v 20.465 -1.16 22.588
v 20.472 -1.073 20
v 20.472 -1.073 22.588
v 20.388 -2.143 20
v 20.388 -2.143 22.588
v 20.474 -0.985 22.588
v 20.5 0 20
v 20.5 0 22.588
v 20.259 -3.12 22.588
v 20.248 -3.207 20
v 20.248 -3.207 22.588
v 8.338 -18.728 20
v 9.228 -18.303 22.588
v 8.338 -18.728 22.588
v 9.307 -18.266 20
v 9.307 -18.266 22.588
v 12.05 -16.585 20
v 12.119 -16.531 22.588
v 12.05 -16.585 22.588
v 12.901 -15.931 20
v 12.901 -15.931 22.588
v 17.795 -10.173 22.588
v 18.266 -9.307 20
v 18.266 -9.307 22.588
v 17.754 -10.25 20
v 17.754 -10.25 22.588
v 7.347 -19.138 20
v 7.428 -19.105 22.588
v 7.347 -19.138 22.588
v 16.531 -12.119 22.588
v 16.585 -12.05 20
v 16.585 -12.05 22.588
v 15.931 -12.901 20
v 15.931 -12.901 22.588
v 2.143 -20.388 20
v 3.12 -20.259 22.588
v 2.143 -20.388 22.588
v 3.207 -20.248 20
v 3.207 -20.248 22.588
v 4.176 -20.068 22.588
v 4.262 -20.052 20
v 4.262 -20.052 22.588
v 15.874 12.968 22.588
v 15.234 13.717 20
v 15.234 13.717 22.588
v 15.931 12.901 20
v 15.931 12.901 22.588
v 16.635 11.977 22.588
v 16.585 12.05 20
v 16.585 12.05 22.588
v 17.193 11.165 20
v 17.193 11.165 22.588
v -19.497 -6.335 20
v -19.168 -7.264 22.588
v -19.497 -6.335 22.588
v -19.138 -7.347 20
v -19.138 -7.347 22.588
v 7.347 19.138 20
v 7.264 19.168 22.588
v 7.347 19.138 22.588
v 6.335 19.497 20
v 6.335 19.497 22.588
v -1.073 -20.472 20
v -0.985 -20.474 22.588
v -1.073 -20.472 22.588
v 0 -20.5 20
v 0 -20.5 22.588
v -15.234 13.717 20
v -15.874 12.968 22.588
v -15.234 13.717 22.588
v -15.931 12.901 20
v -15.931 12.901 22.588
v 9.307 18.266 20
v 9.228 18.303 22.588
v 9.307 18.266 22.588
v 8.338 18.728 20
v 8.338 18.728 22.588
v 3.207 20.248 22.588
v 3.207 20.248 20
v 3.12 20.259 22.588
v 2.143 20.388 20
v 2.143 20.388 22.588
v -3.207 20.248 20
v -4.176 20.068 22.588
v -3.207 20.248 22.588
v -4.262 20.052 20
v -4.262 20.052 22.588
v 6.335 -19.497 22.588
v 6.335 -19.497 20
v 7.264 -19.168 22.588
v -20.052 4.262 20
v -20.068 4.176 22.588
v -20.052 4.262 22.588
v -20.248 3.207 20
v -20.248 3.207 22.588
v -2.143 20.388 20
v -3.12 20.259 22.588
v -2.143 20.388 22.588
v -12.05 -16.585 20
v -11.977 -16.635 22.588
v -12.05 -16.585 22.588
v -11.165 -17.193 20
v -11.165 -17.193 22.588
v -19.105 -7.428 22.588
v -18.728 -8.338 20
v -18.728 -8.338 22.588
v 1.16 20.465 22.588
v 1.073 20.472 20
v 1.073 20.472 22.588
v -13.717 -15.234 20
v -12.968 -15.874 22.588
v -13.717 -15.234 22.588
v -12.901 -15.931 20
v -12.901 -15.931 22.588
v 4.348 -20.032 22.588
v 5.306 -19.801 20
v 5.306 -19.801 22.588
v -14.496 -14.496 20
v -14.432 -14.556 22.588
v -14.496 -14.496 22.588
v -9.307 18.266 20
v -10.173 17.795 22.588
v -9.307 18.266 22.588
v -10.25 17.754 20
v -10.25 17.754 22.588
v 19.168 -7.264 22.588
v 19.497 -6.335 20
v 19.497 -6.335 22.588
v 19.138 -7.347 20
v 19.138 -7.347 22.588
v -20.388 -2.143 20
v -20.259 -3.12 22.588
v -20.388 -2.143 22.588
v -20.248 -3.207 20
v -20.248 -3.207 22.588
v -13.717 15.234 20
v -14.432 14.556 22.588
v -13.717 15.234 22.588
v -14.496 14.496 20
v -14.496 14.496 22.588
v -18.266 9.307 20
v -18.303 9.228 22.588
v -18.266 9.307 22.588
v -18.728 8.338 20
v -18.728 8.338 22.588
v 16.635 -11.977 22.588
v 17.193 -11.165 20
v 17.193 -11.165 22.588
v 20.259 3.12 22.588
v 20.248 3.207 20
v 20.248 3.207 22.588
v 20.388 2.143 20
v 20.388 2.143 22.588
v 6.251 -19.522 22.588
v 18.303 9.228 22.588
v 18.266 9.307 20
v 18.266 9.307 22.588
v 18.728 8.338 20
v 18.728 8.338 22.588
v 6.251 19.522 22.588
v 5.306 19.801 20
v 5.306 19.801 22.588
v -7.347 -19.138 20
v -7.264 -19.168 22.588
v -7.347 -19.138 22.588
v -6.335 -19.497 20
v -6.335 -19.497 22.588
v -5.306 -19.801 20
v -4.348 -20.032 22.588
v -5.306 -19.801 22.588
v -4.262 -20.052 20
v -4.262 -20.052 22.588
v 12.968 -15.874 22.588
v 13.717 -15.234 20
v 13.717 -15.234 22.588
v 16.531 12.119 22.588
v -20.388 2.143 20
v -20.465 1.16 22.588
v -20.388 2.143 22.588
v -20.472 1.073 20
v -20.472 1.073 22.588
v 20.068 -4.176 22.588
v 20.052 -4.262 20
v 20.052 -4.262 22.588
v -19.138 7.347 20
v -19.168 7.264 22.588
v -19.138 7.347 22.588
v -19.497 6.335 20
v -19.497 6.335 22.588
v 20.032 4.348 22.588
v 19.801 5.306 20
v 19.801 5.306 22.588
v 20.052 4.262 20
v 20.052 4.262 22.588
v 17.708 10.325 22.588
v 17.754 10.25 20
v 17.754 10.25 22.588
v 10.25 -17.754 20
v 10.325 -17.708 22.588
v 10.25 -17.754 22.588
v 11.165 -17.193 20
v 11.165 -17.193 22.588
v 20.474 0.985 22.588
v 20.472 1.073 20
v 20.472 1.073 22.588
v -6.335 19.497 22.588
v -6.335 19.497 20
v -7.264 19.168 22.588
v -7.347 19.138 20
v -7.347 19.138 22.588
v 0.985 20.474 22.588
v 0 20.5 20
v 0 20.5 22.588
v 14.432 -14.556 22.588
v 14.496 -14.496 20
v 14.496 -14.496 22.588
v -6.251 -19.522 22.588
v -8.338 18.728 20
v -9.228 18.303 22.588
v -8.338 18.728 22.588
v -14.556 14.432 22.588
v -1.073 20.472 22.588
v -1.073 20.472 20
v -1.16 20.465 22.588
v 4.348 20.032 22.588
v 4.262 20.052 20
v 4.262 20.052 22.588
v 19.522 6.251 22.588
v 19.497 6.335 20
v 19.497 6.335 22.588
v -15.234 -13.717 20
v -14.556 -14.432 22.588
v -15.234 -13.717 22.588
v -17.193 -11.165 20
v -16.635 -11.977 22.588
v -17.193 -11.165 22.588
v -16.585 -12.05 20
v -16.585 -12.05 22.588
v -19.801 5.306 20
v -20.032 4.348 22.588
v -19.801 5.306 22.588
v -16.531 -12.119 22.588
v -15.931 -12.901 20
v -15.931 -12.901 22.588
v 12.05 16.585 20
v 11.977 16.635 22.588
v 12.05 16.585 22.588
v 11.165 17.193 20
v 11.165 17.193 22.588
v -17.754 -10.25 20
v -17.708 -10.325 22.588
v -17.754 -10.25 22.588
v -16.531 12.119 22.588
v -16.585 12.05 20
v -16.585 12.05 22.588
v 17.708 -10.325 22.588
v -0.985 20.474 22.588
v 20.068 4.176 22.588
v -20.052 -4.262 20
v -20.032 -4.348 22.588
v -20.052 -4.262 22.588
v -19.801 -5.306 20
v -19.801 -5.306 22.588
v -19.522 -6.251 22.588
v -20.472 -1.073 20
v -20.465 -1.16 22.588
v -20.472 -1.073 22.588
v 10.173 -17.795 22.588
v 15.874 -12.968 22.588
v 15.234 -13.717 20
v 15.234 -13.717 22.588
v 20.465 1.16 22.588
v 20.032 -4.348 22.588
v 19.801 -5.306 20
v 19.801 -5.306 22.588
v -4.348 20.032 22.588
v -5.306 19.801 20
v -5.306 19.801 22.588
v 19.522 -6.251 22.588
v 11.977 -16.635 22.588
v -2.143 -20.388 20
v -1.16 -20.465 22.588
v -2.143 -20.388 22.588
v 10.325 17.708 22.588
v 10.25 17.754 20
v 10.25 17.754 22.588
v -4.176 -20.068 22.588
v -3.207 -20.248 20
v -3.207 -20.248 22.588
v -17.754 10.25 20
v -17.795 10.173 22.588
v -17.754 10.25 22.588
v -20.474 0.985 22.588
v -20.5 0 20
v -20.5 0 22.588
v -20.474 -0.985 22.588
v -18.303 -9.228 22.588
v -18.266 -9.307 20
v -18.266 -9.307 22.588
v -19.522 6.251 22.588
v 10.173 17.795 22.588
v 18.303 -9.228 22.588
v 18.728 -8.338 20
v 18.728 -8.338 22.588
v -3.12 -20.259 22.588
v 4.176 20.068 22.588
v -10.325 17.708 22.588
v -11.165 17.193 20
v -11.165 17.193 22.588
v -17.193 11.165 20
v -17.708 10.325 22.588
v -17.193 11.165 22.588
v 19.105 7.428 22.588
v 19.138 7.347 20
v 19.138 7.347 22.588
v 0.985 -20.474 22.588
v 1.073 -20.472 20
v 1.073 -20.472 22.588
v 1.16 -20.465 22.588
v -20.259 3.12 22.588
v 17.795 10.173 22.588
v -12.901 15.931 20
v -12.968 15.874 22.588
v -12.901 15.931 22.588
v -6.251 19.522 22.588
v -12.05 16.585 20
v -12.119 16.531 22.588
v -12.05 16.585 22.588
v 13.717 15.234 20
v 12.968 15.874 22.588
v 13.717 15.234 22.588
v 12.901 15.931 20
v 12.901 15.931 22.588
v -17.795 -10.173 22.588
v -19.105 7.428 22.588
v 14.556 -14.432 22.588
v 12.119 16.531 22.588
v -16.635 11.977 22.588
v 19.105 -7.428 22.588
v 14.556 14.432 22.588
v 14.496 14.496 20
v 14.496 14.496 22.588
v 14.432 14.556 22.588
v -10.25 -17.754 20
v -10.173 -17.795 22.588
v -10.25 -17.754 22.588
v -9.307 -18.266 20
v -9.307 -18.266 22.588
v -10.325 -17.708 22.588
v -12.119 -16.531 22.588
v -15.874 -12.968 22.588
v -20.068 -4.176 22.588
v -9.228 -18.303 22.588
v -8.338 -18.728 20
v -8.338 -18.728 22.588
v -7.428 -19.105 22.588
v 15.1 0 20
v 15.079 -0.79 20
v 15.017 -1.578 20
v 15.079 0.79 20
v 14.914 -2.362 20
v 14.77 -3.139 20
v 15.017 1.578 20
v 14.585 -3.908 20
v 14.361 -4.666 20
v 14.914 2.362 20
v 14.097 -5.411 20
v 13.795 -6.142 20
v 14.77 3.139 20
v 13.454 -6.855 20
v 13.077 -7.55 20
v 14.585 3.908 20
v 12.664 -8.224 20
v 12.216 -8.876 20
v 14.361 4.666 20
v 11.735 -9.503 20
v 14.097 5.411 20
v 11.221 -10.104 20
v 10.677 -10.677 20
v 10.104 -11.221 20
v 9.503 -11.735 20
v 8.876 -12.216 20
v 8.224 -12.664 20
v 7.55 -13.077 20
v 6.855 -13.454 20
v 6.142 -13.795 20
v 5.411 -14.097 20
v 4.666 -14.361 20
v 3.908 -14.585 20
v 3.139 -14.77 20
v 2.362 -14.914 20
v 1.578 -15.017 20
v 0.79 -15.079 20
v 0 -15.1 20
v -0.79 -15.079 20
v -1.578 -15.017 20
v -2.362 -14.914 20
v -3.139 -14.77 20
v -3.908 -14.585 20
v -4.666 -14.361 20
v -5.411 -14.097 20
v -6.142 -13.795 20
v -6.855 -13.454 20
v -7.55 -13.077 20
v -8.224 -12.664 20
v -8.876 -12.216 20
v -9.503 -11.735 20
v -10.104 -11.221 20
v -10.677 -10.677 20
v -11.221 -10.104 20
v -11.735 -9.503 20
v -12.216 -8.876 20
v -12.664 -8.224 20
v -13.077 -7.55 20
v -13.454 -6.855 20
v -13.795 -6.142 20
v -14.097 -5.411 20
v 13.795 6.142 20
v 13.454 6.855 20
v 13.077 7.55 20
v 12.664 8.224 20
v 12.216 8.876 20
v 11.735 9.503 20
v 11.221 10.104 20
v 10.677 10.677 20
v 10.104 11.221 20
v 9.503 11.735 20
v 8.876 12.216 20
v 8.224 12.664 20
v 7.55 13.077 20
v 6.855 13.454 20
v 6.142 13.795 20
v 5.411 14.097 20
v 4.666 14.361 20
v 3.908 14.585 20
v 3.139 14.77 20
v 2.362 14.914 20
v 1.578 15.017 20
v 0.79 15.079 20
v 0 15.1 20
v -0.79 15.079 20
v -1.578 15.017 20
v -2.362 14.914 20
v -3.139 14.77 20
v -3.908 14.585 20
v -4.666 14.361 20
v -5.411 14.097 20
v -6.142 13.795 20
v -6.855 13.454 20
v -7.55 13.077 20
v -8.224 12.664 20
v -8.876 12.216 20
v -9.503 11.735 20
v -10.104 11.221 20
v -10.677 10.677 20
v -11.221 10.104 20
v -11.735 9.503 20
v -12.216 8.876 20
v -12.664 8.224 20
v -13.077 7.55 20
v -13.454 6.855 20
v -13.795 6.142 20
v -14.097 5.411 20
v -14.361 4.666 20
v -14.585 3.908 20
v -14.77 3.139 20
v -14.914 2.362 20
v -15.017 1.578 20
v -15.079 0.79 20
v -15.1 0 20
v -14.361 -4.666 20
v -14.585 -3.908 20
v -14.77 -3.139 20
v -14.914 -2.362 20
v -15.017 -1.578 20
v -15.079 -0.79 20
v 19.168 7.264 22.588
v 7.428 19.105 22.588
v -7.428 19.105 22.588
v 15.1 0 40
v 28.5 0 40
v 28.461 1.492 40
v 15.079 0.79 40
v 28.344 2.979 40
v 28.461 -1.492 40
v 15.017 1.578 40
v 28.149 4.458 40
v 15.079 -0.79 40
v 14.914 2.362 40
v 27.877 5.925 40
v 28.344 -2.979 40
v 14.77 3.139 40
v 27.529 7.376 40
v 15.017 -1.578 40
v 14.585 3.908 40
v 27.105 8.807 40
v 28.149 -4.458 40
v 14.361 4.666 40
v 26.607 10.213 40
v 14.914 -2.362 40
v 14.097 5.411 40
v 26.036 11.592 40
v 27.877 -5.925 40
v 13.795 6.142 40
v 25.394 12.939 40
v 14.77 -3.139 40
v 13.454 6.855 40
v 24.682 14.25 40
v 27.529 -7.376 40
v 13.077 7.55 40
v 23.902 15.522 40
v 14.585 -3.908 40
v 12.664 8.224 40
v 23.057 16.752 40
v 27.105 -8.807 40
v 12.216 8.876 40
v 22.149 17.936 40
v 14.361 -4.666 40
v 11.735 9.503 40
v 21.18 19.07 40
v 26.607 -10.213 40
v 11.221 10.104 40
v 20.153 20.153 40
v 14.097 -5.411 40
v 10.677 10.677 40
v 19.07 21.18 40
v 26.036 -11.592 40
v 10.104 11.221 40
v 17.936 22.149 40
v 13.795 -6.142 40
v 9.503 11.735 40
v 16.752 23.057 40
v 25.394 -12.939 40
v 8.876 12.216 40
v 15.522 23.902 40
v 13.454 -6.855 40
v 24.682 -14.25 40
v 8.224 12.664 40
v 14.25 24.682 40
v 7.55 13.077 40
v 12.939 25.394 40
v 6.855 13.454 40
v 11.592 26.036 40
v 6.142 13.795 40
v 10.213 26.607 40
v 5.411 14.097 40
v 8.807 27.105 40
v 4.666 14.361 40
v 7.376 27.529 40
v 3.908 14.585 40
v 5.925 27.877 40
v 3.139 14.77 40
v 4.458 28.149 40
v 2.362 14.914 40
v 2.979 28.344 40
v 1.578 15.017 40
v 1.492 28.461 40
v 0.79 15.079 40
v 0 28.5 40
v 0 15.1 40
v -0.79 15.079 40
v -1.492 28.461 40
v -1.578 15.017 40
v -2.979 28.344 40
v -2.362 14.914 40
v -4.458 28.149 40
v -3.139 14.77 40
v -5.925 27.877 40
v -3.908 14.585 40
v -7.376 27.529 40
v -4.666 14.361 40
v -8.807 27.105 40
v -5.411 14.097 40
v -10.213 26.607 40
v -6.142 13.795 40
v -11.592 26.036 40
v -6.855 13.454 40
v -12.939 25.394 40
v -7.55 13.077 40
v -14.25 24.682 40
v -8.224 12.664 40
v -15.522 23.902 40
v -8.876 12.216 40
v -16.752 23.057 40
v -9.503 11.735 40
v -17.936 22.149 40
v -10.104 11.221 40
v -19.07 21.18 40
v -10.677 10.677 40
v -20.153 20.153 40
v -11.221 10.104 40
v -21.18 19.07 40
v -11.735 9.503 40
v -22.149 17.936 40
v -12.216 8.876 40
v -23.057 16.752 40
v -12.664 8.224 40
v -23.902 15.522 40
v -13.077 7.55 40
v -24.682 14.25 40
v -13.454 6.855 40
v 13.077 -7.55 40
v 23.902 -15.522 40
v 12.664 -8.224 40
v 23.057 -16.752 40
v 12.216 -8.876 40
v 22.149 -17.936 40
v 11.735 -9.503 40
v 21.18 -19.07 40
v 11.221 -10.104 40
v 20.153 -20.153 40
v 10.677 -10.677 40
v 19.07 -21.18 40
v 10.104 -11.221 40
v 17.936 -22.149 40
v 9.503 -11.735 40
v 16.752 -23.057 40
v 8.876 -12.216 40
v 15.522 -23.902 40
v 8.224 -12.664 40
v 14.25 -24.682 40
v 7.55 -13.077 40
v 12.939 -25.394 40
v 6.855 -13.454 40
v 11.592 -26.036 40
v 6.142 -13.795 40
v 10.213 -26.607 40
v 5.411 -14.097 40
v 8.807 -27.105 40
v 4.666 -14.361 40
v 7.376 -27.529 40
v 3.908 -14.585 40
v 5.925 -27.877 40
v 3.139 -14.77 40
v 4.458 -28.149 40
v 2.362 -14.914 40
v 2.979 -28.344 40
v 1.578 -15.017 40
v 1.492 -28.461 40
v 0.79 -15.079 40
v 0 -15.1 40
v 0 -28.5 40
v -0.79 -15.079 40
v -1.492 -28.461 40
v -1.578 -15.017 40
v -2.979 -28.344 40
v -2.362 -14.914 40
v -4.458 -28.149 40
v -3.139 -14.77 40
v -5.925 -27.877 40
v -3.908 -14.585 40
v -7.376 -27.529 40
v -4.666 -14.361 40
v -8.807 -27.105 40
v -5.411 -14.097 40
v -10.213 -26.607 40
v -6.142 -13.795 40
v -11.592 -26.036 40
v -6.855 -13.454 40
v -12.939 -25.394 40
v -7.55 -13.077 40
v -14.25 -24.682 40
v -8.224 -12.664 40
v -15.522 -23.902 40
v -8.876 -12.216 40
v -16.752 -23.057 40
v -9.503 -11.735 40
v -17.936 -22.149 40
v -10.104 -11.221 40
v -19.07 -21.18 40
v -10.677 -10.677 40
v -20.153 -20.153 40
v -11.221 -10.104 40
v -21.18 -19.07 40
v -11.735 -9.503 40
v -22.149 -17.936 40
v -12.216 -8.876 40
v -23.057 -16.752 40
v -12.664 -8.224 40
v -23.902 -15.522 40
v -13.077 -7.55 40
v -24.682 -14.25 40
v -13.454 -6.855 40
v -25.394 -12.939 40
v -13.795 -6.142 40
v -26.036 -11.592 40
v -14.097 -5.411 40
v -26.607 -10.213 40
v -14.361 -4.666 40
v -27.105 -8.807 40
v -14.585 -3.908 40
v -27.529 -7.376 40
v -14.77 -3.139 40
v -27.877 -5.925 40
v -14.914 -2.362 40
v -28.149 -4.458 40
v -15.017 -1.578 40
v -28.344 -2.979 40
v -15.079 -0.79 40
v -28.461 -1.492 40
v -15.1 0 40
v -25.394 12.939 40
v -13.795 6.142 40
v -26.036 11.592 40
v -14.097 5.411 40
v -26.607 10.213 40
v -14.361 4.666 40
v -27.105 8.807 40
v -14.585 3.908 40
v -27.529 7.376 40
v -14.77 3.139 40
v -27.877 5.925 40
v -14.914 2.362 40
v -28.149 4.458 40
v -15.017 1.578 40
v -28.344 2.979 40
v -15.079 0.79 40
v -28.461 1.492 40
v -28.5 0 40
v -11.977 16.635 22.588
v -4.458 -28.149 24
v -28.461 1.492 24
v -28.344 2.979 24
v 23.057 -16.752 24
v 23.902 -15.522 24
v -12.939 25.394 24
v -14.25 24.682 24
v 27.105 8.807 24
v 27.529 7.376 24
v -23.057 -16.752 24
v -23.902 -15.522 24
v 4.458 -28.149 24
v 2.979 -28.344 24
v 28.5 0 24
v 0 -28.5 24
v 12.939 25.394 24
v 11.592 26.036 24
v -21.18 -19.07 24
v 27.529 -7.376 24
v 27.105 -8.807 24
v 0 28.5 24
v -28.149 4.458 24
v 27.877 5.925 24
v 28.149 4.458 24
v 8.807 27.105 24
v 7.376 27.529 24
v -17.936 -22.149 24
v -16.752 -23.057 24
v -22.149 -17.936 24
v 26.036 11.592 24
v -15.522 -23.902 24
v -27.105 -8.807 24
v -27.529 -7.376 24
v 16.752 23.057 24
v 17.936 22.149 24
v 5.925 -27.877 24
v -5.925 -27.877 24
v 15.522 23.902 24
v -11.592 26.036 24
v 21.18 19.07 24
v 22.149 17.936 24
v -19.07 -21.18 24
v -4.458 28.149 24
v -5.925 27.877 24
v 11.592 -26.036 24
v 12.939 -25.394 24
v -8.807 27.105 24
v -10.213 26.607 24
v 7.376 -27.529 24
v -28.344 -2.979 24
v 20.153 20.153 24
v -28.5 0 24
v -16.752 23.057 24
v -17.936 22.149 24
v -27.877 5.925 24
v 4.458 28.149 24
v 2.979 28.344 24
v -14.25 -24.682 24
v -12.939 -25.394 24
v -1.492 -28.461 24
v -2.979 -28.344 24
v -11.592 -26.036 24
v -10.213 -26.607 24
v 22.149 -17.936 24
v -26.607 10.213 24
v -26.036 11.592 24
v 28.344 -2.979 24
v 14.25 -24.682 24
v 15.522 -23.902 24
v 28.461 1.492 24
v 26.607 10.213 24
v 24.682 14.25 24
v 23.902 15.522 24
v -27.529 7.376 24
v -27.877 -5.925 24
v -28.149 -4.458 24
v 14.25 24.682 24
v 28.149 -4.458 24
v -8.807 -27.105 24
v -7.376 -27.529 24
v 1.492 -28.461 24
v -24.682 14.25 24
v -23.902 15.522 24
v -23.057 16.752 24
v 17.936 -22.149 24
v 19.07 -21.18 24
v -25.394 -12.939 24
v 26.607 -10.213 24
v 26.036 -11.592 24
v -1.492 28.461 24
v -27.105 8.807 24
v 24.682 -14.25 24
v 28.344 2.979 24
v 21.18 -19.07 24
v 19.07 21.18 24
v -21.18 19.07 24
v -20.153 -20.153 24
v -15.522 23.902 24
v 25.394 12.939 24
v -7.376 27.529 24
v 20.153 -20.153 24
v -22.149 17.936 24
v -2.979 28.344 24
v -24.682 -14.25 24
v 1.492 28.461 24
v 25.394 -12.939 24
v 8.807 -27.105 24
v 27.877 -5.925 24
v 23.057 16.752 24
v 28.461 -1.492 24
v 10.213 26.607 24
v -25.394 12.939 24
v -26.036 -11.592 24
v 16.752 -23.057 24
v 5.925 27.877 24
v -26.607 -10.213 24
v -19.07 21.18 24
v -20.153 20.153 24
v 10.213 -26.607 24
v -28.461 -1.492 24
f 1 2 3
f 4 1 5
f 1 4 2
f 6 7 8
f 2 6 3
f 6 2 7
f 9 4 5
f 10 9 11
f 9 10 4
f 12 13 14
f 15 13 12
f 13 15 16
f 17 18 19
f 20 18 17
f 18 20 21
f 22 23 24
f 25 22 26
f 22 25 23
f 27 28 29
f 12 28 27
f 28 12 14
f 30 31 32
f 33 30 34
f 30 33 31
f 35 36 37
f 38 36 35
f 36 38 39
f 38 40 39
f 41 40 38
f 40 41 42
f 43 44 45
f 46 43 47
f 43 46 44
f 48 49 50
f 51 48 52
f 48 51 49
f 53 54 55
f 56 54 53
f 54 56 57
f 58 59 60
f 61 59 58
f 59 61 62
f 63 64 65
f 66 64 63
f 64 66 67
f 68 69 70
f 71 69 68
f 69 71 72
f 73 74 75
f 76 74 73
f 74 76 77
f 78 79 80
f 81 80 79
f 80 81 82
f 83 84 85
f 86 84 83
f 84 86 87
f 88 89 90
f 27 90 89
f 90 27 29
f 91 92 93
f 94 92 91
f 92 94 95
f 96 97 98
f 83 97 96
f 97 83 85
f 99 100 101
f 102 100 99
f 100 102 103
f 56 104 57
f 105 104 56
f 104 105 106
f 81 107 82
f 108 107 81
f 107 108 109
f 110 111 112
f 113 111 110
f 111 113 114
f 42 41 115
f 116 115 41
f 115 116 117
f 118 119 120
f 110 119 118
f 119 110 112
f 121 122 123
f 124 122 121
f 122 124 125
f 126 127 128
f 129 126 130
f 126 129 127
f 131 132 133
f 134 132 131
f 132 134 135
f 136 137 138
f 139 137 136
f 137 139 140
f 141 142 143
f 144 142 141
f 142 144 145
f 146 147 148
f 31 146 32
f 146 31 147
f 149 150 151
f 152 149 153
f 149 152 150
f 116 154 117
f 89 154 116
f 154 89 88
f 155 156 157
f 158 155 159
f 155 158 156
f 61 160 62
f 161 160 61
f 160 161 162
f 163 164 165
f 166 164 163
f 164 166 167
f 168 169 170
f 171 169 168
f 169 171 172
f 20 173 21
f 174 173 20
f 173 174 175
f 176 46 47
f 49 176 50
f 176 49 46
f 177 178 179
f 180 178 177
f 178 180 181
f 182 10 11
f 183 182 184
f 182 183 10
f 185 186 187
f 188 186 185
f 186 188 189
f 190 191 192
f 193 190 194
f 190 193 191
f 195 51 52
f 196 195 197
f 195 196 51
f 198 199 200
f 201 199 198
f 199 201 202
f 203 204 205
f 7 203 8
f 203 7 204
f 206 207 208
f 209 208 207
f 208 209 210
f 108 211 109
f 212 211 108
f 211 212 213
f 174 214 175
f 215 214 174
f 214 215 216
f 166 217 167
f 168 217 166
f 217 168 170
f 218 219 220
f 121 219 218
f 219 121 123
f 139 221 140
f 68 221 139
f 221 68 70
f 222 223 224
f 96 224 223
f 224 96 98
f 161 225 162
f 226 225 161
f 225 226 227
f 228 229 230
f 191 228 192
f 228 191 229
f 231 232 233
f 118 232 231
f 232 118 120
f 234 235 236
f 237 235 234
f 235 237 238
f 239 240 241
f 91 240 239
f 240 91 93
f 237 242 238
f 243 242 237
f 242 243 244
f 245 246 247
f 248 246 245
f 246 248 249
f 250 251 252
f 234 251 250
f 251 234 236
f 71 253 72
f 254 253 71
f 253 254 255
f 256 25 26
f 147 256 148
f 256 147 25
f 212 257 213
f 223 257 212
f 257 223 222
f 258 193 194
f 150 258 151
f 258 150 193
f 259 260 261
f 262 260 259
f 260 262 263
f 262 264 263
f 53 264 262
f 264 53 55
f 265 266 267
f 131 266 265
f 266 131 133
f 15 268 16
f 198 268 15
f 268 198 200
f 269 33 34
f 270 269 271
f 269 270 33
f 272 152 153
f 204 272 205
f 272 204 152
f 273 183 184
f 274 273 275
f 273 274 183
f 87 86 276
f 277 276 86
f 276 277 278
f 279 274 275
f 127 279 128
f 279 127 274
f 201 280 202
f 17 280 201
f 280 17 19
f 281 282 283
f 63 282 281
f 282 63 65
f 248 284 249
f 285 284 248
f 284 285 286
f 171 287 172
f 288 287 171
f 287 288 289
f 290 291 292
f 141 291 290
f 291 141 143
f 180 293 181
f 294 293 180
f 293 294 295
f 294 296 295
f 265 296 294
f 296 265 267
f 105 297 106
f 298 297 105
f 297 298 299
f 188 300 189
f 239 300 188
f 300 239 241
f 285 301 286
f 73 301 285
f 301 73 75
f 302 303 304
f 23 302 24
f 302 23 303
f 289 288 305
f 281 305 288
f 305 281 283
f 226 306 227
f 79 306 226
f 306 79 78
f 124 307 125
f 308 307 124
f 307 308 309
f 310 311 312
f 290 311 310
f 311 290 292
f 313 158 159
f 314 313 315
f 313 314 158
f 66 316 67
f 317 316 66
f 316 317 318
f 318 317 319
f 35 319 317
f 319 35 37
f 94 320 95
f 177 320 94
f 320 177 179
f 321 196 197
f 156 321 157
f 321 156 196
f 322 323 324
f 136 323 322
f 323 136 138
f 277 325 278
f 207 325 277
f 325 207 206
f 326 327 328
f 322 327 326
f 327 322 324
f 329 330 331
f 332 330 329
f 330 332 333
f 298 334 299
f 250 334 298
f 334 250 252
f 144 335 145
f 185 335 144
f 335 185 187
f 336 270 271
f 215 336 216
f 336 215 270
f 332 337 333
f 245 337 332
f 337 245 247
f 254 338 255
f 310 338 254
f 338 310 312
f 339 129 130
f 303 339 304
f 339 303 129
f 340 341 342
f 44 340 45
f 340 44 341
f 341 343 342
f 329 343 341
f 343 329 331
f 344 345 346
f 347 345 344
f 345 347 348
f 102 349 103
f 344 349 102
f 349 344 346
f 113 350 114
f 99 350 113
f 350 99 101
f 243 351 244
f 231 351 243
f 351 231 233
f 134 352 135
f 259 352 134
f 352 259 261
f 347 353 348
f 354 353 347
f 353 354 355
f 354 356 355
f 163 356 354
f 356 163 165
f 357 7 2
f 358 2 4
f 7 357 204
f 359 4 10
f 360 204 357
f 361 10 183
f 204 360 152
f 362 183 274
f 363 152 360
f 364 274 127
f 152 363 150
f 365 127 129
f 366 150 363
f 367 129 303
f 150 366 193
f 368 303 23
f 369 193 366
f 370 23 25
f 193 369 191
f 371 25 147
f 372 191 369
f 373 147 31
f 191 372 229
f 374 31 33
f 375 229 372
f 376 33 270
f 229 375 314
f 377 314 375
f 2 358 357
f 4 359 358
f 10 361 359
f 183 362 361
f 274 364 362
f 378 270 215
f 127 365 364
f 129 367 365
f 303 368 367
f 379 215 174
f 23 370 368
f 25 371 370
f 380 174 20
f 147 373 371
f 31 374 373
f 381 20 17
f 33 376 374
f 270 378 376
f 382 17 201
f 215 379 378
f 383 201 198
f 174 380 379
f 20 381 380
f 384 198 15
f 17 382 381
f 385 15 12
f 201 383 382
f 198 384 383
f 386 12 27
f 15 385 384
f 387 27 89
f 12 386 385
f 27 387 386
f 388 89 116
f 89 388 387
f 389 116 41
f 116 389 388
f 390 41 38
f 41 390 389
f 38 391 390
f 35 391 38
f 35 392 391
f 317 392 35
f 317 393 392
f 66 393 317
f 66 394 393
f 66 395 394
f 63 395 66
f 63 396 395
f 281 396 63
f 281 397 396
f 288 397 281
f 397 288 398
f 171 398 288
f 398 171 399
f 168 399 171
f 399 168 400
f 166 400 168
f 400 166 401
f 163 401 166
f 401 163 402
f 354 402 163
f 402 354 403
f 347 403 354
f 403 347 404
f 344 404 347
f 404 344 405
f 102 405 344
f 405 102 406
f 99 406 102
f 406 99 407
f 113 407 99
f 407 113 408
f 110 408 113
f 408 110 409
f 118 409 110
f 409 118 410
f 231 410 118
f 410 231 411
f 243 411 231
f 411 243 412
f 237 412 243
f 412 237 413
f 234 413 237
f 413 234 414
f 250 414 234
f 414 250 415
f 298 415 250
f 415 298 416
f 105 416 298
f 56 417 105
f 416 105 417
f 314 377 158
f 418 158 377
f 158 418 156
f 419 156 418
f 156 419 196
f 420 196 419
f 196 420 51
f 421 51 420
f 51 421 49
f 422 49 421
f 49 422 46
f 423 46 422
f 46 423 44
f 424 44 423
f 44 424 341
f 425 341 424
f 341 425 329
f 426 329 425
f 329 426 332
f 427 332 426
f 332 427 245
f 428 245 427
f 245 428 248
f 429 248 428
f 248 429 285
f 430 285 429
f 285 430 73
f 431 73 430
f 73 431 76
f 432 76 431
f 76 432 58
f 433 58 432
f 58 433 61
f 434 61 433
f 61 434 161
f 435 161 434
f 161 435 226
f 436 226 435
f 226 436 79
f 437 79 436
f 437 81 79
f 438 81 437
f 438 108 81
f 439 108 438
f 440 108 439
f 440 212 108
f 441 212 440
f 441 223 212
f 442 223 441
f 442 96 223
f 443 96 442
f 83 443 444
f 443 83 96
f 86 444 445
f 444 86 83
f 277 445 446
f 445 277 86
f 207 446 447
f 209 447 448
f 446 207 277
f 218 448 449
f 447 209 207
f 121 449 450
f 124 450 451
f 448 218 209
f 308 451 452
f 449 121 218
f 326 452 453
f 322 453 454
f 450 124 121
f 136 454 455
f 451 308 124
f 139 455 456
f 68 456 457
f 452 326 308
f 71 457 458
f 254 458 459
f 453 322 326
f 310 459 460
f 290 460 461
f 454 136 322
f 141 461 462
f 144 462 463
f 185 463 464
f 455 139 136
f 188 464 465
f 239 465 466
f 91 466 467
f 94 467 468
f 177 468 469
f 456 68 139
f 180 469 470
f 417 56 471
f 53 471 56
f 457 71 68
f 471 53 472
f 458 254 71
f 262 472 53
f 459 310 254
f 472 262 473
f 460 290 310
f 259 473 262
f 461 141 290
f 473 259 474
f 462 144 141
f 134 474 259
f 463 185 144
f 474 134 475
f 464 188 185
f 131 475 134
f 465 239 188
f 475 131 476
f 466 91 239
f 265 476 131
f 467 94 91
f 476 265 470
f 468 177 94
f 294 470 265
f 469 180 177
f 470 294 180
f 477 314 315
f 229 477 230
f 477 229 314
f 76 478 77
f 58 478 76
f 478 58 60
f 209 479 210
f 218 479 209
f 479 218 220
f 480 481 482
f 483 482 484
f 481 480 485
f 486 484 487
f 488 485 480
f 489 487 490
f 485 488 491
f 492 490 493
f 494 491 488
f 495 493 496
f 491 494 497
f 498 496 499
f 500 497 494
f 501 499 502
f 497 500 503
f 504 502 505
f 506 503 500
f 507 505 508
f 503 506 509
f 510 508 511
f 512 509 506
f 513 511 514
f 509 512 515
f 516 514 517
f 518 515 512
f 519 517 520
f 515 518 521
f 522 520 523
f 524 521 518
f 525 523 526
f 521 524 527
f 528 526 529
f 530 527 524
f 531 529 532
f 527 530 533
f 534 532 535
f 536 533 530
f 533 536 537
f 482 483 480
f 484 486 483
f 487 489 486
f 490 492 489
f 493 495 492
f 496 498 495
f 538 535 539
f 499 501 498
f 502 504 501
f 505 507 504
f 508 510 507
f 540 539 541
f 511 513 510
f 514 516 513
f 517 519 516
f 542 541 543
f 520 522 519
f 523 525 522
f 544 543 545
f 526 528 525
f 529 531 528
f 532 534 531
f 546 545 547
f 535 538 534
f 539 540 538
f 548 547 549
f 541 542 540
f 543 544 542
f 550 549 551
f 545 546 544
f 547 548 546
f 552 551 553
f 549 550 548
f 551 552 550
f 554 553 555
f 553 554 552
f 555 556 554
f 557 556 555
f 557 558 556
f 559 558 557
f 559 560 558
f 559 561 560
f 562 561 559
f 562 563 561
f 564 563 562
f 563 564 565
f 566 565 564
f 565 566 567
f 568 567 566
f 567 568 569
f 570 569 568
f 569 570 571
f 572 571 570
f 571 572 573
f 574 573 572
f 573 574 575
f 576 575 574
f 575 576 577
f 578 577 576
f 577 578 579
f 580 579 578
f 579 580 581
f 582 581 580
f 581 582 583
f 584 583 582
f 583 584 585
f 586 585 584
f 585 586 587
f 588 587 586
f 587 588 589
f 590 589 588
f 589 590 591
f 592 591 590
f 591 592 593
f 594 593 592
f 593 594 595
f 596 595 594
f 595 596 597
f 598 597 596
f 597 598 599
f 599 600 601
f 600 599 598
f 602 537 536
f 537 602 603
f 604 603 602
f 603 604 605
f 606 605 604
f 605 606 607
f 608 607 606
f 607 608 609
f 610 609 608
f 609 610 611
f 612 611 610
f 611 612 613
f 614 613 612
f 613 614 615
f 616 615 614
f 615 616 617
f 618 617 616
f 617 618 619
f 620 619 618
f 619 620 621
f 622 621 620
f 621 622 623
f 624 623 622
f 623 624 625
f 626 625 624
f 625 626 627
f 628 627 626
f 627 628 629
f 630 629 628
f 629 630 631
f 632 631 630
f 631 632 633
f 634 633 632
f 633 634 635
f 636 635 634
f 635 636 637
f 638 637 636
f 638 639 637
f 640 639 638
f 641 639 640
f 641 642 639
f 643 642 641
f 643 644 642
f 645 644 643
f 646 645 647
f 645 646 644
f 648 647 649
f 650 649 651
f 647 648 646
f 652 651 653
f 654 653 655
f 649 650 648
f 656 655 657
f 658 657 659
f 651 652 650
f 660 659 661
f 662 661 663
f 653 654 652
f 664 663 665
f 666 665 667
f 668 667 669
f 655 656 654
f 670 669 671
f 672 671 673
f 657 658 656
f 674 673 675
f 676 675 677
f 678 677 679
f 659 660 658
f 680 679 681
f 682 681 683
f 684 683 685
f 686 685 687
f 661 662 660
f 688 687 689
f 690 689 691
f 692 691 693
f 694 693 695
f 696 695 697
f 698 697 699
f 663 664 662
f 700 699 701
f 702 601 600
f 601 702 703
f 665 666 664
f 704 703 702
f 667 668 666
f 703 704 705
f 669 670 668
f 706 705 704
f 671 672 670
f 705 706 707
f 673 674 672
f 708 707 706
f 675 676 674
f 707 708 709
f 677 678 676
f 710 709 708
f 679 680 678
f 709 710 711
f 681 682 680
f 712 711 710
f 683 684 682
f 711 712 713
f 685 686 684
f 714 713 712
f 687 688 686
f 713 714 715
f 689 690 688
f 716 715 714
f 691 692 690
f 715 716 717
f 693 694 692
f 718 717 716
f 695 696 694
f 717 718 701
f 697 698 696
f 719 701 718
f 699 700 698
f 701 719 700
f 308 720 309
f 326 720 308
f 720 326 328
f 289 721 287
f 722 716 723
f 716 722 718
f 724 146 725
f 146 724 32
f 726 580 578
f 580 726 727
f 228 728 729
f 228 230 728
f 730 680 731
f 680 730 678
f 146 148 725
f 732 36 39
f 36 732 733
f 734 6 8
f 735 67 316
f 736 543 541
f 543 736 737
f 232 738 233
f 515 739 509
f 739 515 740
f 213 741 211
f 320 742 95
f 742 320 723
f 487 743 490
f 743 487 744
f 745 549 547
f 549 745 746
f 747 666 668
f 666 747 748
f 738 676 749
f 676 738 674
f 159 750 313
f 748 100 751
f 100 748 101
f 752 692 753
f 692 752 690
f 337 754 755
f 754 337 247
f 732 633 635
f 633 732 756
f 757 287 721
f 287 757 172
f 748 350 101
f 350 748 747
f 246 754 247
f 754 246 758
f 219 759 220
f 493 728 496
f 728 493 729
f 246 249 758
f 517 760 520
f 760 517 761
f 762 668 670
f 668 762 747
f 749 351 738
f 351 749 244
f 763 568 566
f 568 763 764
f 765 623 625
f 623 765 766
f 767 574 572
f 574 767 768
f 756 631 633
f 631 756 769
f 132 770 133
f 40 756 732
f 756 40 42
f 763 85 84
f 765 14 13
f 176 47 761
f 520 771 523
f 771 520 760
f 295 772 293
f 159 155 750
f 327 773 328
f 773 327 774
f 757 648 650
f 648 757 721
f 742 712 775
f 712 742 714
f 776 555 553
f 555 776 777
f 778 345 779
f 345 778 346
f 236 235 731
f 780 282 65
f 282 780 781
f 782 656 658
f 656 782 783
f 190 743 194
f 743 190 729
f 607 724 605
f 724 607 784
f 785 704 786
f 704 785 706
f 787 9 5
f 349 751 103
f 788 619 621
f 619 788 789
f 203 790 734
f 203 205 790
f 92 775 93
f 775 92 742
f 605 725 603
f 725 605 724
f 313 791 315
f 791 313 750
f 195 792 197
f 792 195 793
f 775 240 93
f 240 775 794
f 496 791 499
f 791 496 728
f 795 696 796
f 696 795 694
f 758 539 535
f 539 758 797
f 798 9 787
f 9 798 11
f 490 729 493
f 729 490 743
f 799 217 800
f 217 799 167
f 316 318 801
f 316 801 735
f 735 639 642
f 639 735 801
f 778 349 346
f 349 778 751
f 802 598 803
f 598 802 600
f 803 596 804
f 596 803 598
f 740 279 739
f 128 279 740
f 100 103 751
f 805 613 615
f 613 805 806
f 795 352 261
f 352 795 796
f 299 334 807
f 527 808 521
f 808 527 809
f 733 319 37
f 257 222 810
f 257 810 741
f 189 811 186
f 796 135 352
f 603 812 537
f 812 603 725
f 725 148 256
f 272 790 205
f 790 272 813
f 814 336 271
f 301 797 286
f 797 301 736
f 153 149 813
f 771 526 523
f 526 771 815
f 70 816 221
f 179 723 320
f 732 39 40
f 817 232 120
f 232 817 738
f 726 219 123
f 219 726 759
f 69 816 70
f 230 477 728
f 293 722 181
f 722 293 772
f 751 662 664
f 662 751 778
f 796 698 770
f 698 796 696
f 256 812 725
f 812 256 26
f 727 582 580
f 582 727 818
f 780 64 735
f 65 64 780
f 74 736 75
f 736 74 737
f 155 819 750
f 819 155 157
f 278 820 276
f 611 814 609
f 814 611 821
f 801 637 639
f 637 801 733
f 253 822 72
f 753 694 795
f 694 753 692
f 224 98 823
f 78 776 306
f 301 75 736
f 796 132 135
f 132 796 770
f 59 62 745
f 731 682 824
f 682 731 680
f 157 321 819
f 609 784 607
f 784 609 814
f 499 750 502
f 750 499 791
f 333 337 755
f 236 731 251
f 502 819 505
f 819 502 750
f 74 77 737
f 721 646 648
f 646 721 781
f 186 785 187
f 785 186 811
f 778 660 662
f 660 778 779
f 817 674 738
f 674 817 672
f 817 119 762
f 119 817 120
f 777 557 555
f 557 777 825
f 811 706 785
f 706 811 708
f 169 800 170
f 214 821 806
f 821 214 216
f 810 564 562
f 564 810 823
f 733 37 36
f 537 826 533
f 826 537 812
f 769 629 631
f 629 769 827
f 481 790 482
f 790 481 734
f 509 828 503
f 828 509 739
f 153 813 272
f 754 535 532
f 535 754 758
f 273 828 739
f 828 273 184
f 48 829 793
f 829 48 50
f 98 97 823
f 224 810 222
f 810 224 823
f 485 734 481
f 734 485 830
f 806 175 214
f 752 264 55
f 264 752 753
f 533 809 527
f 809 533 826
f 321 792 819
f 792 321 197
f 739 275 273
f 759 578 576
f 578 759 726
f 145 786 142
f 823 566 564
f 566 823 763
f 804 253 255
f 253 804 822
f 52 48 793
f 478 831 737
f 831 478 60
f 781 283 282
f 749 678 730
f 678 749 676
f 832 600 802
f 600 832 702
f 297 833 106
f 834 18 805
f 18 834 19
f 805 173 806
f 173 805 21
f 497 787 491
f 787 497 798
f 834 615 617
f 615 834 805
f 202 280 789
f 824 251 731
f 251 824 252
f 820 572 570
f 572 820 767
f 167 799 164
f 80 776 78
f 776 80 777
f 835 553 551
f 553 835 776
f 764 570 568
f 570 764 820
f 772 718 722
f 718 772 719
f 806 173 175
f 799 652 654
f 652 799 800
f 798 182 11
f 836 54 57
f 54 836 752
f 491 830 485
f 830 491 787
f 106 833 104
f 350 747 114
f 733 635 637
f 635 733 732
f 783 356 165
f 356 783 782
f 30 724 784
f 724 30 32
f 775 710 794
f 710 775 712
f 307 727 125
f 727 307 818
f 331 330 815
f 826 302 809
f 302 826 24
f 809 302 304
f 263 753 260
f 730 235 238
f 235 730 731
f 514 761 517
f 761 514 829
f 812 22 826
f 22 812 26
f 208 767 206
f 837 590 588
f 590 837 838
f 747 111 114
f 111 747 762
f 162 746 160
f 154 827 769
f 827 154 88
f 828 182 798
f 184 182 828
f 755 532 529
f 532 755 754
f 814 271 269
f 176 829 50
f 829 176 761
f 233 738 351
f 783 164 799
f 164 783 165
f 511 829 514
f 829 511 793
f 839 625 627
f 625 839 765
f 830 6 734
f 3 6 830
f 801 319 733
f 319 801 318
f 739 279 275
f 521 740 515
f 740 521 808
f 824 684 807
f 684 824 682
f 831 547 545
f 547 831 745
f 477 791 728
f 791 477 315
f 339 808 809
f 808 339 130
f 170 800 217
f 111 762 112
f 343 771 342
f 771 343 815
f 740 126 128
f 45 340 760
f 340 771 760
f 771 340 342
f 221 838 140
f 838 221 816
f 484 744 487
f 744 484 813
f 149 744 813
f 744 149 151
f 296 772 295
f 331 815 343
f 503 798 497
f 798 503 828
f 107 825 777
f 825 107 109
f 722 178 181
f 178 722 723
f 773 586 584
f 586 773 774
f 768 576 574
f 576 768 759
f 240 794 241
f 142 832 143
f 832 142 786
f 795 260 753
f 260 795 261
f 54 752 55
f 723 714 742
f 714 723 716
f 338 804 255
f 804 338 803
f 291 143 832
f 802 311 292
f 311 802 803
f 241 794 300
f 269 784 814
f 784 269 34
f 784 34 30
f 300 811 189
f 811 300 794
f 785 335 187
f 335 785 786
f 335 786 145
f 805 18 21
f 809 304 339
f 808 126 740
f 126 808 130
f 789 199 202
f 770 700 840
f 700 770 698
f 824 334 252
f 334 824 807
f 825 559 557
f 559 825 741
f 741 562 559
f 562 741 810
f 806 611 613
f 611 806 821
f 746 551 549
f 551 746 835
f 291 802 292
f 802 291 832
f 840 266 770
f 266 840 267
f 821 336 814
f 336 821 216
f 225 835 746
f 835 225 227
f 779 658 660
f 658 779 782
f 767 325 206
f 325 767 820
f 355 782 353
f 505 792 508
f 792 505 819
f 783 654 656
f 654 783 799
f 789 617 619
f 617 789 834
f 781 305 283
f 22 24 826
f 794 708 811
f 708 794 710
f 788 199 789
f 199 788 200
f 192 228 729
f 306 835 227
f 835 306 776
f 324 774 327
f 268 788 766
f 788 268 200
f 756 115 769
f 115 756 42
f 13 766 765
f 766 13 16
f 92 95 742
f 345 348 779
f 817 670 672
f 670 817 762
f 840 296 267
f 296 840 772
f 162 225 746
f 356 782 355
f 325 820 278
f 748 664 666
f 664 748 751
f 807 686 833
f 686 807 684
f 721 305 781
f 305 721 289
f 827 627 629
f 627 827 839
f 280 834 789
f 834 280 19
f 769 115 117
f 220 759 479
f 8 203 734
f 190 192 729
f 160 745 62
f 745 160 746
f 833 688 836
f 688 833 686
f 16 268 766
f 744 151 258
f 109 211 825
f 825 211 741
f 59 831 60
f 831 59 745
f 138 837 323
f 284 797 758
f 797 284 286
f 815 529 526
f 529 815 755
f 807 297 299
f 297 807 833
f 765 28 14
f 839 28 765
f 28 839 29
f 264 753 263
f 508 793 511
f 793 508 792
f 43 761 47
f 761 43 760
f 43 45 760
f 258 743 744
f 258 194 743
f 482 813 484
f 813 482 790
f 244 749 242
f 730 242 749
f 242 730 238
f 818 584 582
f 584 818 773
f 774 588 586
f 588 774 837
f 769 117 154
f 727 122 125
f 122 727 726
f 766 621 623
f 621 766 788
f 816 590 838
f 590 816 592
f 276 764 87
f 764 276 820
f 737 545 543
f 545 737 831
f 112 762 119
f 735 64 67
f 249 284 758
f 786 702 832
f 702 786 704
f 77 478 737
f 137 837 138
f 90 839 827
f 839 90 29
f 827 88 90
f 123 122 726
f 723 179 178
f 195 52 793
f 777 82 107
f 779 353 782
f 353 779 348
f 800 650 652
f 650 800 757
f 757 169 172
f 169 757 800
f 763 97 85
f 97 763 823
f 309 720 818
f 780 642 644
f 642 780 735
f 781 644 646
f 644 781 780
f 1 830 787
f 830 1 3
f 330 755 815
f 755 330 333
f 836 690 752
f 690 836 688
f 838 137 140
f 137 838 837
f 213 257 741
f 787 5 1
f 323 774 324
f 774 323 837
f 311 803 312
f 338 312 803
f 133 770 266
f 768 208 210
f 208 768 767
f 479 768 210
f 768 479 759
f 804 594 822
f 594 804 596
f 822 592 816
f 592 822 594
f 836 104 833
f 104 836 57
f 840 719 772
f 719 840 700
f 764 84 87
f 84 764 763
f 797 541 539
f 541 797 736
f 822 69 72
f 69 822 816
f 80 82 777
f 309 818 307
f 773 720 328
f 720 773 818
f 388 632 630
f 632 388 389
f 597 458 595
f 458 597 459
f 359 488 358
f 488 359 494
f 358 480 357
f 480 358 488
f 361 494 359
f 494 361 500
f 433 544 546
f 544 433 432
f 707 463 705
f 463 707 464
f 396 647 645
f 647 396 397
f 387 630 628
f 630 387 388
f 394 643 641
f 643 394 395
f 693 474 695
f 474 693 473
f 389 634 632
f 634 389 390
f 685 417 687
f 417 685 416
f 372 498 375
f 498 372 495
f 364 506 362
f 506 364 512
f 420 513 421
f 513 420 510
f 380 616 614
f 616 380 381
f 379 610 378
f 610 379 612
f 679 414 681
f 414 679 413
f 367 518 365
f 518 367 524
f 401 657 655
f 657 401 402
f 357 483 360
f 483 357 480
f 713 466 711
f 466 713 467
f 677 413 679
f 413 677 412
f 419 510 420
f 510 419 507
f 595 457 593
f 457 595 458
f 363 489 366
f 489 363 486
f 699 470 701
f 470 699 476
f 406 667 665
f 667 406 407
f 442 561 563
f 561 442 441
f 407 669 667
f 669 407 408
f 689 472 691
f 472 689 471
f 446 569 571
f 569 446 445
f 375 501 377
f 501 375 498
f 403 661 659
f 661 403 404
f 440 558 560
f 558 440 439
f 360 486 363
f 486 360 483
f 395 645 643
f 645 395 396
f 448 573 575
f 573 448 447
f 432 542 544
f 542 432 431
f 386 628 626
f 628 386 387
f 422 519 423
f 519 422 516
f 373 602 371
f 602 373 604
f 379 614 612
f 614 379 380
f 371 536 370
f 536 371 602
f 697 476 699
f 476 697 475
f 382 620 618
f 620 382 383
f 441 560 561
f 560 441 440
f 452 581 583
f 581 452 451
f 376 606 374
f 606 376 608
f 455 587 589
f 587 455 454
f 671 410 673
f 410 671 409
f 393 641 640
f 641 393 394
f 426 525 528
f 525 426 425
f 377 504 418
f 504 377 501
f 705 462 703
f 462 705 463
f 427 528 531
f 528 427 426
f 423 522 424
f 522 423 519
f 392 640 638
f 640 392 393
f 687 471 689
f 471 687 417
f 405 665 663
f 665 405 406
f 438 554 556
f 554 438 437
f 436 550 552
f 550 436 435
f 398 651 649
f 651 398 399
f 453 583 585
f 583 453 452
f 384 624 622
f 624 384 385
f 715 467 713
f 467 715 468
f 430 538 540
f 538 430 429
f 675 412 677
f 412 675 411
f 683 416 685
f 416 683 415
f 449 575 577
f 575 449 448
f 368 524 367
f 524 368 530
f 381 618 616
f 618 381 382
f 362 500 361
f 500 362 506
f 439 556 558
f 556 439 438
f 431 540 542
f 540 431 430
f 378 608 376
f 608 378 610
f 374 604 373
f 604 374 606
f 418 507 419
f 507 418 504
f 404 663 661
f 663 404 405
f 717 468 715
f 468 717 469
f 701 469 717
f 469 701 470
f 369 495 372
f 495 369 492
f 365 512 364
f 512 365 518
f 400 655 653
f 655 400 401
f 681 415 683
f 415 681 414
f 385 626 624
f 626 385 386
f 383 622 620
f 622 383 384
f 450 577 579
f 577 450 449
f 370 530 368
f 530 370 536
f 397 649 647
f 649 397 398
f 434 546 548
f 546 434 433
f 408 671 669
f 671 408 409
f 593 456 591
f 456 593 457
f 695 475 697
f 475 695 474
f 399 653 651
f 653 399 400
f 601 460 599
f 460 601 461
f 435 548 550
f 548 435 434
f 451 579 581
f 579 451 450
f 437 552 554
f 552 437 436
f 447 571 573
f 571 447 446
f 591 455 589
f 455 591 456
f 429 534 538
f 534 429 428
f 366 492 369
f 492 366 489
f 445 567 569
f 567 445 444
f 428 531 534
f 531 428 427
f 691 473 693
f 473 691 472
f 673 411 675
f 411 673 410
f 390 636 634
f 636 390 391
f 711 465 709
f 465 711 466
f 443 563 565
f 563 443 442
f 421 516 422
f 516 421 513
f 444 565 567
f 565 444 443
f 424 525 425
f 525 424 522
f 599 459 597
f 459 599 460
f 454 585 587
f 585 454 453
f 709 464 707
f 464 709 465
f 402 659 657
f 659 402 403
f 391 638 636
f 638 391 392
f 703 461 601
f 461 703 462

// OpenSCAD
$fn=120;
fudge=0.2;

//%translate([0,0,20]) 
//    import("../printer/Bogies/files/CasterTInner.stl");
//translate([0,0,20]) 
//    import("../printer/Bogies/files/CasterInner.stl");
//%translate([0,0,20]) 
//    import("../printer/Bogies/files/CasterOuter.stl");

//inner_caster();
//outer_caster();

//inner_caster(od=57, rd=41);
outer_caster(od=57, rd=41);

module outer_caster(od=52, rd=36){
    translate([0,0,40]) rotate([180,0,0])
    difference(){
        inner_caster_lobe(od=od, rd=rd);
        translate([0,0,-0.1]) cylinder(d=30+fudge, h=40);
    }
}

module inner_caster(od=52, rd=36){
    difference(){
        union(){
            inner_caster_lobe(od=od, rd=rd);
            cylinder(d=30, h=40);
        }
        translate([0,0,-0.05]) bearing_cutout();
        translate([0,0,40.05]) rotate([180,0,0]) 
            bearing_cutout();
    }
}

module inner_caster_lobe(od=52, rd=36){
    cylinder(d=rd, h=20);
    hull(){
        cylinder(d=od, h=16);
        cylinder(d=rd-1, h=17.5);
    }
}

module bearing_cutout(){
    cylinder(d=4.5+fudge, h=45);
    hull(){
        cylinder(d=22+fudge, h=7);
        cylinder(d=4.5+fudge, h=15.7);
    }
}
